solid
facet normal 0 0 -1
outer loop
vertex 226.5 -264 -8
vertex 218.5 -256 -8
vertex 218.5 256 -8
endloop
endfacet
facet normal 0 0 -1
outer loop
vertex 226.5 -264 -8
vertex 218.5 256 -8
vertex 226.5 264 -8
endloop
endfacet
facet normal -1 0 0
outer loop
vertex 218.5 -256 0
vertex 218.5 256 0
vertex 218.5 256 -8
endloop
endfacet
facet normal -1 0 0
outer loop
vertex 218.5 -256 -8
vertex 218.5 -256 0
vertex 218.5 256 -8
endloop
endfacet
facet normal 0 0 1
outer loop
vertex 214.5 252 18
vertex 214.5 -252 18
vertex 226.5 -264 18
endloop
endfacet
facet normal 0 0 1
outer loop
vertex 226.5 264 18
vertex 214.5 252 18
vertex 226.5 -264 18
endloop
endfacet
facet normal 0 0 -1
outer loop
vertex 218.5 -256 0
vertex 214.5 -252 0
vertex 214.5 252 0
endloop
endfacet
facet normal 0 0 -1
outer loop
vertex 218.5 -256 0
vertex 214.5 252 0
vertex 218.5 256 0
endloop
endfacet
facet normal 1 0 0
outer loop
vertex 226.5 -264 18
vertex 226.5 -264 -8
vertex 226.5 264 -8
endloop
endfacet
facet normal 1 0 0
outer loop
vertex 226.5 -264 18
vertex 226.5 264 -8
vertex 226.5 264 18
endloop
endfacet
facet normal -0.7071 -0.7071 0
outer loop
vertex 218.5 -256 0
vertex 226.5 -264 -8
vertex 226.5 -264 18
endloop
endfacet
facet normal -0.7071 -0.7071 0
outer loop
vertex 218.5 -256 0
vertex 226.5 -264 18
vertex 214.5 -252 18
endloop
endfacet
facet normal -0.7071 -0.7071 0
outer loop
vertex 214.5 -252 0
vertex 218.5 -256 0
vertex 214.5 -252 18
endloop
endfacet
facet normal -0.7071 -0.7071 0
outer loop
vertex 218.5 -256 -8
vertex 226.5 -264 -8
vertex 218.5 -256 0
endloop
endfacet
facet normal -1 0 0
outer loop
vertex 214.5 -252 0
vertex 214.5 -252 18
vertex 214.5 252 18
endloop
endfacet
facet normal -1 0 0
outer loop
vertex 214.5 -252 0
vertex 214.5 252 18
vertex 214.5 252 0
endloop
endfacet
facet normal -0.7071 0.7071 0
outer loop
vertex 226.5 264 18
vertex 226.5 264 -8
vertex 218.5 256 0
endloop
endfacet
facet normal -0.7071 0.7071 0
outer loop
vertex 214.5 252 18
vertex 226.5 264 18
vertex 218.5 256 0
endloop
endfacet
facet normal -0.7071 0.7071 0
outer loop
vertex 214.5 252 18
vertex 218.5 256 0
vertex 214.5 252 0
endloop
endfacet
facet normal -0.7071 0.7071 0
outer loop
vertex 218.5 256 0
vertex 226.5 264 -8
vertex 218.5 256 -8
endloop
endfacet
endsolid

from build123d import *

# Parameters (mm, degrees)
PAD002_DEPTH         = 350
POCKET001_DEPTH      = 8.001
POCKET001_DEPTH_BACK = 30.001
SKETCH_W             = 12
SKETCH_H             = 12
POCKET_DEPTH         = 264.001
POCKET_DEPTH_BACK    = 264.001


with BuildPart() as part:
    # Sketch003 → Pad002 (new body, symmetric)
    with BuildSketch(Plane.XZ):
        Polygon((214.5, 0), (218.5, 0), (218.5, -8), (226.5, -8), (226.5, 25.632357), (214.5, 30), align=None)
    extrude(amount=PAD002_DEPTH, both=True)

    # Sketch004 → Pocket001 (cut, two sides)
    with BuildSketch(Plane.XY) as pocket001_sk:
        Polygon((226.5, -350), (226.5, -264), (214.5, -252), (214.5, -350), align=None)
        Polygon((226.5, 350), (226.5, 264), (214.5, 252), (214.5, 350), align=None)
    extrude(amount=-POCKET001_DEPTH, mode=Mode.SUBTRACT)
    extrude(pocket001_sk.sketch, amount=POCKET001_DEPTH_BACK, mode=Mode.SUBTRACT)

    # Sketch → Pocket (cut, two sides)
    with BuildSketch(Plane.XZ) as pocket_sk:
        with Locations((220.5, 24)):
            Rectangle(SKETCH_W, SKETCH_H)
    extrude(amount=-POCKET_DEPTH, mode=Mode.SUBTRACT)
    extrude(pocket_sk.sketch, amount=POCKET_DEPTH_BACK, mode=Mode.SUBTRACT)


solid = part.part
